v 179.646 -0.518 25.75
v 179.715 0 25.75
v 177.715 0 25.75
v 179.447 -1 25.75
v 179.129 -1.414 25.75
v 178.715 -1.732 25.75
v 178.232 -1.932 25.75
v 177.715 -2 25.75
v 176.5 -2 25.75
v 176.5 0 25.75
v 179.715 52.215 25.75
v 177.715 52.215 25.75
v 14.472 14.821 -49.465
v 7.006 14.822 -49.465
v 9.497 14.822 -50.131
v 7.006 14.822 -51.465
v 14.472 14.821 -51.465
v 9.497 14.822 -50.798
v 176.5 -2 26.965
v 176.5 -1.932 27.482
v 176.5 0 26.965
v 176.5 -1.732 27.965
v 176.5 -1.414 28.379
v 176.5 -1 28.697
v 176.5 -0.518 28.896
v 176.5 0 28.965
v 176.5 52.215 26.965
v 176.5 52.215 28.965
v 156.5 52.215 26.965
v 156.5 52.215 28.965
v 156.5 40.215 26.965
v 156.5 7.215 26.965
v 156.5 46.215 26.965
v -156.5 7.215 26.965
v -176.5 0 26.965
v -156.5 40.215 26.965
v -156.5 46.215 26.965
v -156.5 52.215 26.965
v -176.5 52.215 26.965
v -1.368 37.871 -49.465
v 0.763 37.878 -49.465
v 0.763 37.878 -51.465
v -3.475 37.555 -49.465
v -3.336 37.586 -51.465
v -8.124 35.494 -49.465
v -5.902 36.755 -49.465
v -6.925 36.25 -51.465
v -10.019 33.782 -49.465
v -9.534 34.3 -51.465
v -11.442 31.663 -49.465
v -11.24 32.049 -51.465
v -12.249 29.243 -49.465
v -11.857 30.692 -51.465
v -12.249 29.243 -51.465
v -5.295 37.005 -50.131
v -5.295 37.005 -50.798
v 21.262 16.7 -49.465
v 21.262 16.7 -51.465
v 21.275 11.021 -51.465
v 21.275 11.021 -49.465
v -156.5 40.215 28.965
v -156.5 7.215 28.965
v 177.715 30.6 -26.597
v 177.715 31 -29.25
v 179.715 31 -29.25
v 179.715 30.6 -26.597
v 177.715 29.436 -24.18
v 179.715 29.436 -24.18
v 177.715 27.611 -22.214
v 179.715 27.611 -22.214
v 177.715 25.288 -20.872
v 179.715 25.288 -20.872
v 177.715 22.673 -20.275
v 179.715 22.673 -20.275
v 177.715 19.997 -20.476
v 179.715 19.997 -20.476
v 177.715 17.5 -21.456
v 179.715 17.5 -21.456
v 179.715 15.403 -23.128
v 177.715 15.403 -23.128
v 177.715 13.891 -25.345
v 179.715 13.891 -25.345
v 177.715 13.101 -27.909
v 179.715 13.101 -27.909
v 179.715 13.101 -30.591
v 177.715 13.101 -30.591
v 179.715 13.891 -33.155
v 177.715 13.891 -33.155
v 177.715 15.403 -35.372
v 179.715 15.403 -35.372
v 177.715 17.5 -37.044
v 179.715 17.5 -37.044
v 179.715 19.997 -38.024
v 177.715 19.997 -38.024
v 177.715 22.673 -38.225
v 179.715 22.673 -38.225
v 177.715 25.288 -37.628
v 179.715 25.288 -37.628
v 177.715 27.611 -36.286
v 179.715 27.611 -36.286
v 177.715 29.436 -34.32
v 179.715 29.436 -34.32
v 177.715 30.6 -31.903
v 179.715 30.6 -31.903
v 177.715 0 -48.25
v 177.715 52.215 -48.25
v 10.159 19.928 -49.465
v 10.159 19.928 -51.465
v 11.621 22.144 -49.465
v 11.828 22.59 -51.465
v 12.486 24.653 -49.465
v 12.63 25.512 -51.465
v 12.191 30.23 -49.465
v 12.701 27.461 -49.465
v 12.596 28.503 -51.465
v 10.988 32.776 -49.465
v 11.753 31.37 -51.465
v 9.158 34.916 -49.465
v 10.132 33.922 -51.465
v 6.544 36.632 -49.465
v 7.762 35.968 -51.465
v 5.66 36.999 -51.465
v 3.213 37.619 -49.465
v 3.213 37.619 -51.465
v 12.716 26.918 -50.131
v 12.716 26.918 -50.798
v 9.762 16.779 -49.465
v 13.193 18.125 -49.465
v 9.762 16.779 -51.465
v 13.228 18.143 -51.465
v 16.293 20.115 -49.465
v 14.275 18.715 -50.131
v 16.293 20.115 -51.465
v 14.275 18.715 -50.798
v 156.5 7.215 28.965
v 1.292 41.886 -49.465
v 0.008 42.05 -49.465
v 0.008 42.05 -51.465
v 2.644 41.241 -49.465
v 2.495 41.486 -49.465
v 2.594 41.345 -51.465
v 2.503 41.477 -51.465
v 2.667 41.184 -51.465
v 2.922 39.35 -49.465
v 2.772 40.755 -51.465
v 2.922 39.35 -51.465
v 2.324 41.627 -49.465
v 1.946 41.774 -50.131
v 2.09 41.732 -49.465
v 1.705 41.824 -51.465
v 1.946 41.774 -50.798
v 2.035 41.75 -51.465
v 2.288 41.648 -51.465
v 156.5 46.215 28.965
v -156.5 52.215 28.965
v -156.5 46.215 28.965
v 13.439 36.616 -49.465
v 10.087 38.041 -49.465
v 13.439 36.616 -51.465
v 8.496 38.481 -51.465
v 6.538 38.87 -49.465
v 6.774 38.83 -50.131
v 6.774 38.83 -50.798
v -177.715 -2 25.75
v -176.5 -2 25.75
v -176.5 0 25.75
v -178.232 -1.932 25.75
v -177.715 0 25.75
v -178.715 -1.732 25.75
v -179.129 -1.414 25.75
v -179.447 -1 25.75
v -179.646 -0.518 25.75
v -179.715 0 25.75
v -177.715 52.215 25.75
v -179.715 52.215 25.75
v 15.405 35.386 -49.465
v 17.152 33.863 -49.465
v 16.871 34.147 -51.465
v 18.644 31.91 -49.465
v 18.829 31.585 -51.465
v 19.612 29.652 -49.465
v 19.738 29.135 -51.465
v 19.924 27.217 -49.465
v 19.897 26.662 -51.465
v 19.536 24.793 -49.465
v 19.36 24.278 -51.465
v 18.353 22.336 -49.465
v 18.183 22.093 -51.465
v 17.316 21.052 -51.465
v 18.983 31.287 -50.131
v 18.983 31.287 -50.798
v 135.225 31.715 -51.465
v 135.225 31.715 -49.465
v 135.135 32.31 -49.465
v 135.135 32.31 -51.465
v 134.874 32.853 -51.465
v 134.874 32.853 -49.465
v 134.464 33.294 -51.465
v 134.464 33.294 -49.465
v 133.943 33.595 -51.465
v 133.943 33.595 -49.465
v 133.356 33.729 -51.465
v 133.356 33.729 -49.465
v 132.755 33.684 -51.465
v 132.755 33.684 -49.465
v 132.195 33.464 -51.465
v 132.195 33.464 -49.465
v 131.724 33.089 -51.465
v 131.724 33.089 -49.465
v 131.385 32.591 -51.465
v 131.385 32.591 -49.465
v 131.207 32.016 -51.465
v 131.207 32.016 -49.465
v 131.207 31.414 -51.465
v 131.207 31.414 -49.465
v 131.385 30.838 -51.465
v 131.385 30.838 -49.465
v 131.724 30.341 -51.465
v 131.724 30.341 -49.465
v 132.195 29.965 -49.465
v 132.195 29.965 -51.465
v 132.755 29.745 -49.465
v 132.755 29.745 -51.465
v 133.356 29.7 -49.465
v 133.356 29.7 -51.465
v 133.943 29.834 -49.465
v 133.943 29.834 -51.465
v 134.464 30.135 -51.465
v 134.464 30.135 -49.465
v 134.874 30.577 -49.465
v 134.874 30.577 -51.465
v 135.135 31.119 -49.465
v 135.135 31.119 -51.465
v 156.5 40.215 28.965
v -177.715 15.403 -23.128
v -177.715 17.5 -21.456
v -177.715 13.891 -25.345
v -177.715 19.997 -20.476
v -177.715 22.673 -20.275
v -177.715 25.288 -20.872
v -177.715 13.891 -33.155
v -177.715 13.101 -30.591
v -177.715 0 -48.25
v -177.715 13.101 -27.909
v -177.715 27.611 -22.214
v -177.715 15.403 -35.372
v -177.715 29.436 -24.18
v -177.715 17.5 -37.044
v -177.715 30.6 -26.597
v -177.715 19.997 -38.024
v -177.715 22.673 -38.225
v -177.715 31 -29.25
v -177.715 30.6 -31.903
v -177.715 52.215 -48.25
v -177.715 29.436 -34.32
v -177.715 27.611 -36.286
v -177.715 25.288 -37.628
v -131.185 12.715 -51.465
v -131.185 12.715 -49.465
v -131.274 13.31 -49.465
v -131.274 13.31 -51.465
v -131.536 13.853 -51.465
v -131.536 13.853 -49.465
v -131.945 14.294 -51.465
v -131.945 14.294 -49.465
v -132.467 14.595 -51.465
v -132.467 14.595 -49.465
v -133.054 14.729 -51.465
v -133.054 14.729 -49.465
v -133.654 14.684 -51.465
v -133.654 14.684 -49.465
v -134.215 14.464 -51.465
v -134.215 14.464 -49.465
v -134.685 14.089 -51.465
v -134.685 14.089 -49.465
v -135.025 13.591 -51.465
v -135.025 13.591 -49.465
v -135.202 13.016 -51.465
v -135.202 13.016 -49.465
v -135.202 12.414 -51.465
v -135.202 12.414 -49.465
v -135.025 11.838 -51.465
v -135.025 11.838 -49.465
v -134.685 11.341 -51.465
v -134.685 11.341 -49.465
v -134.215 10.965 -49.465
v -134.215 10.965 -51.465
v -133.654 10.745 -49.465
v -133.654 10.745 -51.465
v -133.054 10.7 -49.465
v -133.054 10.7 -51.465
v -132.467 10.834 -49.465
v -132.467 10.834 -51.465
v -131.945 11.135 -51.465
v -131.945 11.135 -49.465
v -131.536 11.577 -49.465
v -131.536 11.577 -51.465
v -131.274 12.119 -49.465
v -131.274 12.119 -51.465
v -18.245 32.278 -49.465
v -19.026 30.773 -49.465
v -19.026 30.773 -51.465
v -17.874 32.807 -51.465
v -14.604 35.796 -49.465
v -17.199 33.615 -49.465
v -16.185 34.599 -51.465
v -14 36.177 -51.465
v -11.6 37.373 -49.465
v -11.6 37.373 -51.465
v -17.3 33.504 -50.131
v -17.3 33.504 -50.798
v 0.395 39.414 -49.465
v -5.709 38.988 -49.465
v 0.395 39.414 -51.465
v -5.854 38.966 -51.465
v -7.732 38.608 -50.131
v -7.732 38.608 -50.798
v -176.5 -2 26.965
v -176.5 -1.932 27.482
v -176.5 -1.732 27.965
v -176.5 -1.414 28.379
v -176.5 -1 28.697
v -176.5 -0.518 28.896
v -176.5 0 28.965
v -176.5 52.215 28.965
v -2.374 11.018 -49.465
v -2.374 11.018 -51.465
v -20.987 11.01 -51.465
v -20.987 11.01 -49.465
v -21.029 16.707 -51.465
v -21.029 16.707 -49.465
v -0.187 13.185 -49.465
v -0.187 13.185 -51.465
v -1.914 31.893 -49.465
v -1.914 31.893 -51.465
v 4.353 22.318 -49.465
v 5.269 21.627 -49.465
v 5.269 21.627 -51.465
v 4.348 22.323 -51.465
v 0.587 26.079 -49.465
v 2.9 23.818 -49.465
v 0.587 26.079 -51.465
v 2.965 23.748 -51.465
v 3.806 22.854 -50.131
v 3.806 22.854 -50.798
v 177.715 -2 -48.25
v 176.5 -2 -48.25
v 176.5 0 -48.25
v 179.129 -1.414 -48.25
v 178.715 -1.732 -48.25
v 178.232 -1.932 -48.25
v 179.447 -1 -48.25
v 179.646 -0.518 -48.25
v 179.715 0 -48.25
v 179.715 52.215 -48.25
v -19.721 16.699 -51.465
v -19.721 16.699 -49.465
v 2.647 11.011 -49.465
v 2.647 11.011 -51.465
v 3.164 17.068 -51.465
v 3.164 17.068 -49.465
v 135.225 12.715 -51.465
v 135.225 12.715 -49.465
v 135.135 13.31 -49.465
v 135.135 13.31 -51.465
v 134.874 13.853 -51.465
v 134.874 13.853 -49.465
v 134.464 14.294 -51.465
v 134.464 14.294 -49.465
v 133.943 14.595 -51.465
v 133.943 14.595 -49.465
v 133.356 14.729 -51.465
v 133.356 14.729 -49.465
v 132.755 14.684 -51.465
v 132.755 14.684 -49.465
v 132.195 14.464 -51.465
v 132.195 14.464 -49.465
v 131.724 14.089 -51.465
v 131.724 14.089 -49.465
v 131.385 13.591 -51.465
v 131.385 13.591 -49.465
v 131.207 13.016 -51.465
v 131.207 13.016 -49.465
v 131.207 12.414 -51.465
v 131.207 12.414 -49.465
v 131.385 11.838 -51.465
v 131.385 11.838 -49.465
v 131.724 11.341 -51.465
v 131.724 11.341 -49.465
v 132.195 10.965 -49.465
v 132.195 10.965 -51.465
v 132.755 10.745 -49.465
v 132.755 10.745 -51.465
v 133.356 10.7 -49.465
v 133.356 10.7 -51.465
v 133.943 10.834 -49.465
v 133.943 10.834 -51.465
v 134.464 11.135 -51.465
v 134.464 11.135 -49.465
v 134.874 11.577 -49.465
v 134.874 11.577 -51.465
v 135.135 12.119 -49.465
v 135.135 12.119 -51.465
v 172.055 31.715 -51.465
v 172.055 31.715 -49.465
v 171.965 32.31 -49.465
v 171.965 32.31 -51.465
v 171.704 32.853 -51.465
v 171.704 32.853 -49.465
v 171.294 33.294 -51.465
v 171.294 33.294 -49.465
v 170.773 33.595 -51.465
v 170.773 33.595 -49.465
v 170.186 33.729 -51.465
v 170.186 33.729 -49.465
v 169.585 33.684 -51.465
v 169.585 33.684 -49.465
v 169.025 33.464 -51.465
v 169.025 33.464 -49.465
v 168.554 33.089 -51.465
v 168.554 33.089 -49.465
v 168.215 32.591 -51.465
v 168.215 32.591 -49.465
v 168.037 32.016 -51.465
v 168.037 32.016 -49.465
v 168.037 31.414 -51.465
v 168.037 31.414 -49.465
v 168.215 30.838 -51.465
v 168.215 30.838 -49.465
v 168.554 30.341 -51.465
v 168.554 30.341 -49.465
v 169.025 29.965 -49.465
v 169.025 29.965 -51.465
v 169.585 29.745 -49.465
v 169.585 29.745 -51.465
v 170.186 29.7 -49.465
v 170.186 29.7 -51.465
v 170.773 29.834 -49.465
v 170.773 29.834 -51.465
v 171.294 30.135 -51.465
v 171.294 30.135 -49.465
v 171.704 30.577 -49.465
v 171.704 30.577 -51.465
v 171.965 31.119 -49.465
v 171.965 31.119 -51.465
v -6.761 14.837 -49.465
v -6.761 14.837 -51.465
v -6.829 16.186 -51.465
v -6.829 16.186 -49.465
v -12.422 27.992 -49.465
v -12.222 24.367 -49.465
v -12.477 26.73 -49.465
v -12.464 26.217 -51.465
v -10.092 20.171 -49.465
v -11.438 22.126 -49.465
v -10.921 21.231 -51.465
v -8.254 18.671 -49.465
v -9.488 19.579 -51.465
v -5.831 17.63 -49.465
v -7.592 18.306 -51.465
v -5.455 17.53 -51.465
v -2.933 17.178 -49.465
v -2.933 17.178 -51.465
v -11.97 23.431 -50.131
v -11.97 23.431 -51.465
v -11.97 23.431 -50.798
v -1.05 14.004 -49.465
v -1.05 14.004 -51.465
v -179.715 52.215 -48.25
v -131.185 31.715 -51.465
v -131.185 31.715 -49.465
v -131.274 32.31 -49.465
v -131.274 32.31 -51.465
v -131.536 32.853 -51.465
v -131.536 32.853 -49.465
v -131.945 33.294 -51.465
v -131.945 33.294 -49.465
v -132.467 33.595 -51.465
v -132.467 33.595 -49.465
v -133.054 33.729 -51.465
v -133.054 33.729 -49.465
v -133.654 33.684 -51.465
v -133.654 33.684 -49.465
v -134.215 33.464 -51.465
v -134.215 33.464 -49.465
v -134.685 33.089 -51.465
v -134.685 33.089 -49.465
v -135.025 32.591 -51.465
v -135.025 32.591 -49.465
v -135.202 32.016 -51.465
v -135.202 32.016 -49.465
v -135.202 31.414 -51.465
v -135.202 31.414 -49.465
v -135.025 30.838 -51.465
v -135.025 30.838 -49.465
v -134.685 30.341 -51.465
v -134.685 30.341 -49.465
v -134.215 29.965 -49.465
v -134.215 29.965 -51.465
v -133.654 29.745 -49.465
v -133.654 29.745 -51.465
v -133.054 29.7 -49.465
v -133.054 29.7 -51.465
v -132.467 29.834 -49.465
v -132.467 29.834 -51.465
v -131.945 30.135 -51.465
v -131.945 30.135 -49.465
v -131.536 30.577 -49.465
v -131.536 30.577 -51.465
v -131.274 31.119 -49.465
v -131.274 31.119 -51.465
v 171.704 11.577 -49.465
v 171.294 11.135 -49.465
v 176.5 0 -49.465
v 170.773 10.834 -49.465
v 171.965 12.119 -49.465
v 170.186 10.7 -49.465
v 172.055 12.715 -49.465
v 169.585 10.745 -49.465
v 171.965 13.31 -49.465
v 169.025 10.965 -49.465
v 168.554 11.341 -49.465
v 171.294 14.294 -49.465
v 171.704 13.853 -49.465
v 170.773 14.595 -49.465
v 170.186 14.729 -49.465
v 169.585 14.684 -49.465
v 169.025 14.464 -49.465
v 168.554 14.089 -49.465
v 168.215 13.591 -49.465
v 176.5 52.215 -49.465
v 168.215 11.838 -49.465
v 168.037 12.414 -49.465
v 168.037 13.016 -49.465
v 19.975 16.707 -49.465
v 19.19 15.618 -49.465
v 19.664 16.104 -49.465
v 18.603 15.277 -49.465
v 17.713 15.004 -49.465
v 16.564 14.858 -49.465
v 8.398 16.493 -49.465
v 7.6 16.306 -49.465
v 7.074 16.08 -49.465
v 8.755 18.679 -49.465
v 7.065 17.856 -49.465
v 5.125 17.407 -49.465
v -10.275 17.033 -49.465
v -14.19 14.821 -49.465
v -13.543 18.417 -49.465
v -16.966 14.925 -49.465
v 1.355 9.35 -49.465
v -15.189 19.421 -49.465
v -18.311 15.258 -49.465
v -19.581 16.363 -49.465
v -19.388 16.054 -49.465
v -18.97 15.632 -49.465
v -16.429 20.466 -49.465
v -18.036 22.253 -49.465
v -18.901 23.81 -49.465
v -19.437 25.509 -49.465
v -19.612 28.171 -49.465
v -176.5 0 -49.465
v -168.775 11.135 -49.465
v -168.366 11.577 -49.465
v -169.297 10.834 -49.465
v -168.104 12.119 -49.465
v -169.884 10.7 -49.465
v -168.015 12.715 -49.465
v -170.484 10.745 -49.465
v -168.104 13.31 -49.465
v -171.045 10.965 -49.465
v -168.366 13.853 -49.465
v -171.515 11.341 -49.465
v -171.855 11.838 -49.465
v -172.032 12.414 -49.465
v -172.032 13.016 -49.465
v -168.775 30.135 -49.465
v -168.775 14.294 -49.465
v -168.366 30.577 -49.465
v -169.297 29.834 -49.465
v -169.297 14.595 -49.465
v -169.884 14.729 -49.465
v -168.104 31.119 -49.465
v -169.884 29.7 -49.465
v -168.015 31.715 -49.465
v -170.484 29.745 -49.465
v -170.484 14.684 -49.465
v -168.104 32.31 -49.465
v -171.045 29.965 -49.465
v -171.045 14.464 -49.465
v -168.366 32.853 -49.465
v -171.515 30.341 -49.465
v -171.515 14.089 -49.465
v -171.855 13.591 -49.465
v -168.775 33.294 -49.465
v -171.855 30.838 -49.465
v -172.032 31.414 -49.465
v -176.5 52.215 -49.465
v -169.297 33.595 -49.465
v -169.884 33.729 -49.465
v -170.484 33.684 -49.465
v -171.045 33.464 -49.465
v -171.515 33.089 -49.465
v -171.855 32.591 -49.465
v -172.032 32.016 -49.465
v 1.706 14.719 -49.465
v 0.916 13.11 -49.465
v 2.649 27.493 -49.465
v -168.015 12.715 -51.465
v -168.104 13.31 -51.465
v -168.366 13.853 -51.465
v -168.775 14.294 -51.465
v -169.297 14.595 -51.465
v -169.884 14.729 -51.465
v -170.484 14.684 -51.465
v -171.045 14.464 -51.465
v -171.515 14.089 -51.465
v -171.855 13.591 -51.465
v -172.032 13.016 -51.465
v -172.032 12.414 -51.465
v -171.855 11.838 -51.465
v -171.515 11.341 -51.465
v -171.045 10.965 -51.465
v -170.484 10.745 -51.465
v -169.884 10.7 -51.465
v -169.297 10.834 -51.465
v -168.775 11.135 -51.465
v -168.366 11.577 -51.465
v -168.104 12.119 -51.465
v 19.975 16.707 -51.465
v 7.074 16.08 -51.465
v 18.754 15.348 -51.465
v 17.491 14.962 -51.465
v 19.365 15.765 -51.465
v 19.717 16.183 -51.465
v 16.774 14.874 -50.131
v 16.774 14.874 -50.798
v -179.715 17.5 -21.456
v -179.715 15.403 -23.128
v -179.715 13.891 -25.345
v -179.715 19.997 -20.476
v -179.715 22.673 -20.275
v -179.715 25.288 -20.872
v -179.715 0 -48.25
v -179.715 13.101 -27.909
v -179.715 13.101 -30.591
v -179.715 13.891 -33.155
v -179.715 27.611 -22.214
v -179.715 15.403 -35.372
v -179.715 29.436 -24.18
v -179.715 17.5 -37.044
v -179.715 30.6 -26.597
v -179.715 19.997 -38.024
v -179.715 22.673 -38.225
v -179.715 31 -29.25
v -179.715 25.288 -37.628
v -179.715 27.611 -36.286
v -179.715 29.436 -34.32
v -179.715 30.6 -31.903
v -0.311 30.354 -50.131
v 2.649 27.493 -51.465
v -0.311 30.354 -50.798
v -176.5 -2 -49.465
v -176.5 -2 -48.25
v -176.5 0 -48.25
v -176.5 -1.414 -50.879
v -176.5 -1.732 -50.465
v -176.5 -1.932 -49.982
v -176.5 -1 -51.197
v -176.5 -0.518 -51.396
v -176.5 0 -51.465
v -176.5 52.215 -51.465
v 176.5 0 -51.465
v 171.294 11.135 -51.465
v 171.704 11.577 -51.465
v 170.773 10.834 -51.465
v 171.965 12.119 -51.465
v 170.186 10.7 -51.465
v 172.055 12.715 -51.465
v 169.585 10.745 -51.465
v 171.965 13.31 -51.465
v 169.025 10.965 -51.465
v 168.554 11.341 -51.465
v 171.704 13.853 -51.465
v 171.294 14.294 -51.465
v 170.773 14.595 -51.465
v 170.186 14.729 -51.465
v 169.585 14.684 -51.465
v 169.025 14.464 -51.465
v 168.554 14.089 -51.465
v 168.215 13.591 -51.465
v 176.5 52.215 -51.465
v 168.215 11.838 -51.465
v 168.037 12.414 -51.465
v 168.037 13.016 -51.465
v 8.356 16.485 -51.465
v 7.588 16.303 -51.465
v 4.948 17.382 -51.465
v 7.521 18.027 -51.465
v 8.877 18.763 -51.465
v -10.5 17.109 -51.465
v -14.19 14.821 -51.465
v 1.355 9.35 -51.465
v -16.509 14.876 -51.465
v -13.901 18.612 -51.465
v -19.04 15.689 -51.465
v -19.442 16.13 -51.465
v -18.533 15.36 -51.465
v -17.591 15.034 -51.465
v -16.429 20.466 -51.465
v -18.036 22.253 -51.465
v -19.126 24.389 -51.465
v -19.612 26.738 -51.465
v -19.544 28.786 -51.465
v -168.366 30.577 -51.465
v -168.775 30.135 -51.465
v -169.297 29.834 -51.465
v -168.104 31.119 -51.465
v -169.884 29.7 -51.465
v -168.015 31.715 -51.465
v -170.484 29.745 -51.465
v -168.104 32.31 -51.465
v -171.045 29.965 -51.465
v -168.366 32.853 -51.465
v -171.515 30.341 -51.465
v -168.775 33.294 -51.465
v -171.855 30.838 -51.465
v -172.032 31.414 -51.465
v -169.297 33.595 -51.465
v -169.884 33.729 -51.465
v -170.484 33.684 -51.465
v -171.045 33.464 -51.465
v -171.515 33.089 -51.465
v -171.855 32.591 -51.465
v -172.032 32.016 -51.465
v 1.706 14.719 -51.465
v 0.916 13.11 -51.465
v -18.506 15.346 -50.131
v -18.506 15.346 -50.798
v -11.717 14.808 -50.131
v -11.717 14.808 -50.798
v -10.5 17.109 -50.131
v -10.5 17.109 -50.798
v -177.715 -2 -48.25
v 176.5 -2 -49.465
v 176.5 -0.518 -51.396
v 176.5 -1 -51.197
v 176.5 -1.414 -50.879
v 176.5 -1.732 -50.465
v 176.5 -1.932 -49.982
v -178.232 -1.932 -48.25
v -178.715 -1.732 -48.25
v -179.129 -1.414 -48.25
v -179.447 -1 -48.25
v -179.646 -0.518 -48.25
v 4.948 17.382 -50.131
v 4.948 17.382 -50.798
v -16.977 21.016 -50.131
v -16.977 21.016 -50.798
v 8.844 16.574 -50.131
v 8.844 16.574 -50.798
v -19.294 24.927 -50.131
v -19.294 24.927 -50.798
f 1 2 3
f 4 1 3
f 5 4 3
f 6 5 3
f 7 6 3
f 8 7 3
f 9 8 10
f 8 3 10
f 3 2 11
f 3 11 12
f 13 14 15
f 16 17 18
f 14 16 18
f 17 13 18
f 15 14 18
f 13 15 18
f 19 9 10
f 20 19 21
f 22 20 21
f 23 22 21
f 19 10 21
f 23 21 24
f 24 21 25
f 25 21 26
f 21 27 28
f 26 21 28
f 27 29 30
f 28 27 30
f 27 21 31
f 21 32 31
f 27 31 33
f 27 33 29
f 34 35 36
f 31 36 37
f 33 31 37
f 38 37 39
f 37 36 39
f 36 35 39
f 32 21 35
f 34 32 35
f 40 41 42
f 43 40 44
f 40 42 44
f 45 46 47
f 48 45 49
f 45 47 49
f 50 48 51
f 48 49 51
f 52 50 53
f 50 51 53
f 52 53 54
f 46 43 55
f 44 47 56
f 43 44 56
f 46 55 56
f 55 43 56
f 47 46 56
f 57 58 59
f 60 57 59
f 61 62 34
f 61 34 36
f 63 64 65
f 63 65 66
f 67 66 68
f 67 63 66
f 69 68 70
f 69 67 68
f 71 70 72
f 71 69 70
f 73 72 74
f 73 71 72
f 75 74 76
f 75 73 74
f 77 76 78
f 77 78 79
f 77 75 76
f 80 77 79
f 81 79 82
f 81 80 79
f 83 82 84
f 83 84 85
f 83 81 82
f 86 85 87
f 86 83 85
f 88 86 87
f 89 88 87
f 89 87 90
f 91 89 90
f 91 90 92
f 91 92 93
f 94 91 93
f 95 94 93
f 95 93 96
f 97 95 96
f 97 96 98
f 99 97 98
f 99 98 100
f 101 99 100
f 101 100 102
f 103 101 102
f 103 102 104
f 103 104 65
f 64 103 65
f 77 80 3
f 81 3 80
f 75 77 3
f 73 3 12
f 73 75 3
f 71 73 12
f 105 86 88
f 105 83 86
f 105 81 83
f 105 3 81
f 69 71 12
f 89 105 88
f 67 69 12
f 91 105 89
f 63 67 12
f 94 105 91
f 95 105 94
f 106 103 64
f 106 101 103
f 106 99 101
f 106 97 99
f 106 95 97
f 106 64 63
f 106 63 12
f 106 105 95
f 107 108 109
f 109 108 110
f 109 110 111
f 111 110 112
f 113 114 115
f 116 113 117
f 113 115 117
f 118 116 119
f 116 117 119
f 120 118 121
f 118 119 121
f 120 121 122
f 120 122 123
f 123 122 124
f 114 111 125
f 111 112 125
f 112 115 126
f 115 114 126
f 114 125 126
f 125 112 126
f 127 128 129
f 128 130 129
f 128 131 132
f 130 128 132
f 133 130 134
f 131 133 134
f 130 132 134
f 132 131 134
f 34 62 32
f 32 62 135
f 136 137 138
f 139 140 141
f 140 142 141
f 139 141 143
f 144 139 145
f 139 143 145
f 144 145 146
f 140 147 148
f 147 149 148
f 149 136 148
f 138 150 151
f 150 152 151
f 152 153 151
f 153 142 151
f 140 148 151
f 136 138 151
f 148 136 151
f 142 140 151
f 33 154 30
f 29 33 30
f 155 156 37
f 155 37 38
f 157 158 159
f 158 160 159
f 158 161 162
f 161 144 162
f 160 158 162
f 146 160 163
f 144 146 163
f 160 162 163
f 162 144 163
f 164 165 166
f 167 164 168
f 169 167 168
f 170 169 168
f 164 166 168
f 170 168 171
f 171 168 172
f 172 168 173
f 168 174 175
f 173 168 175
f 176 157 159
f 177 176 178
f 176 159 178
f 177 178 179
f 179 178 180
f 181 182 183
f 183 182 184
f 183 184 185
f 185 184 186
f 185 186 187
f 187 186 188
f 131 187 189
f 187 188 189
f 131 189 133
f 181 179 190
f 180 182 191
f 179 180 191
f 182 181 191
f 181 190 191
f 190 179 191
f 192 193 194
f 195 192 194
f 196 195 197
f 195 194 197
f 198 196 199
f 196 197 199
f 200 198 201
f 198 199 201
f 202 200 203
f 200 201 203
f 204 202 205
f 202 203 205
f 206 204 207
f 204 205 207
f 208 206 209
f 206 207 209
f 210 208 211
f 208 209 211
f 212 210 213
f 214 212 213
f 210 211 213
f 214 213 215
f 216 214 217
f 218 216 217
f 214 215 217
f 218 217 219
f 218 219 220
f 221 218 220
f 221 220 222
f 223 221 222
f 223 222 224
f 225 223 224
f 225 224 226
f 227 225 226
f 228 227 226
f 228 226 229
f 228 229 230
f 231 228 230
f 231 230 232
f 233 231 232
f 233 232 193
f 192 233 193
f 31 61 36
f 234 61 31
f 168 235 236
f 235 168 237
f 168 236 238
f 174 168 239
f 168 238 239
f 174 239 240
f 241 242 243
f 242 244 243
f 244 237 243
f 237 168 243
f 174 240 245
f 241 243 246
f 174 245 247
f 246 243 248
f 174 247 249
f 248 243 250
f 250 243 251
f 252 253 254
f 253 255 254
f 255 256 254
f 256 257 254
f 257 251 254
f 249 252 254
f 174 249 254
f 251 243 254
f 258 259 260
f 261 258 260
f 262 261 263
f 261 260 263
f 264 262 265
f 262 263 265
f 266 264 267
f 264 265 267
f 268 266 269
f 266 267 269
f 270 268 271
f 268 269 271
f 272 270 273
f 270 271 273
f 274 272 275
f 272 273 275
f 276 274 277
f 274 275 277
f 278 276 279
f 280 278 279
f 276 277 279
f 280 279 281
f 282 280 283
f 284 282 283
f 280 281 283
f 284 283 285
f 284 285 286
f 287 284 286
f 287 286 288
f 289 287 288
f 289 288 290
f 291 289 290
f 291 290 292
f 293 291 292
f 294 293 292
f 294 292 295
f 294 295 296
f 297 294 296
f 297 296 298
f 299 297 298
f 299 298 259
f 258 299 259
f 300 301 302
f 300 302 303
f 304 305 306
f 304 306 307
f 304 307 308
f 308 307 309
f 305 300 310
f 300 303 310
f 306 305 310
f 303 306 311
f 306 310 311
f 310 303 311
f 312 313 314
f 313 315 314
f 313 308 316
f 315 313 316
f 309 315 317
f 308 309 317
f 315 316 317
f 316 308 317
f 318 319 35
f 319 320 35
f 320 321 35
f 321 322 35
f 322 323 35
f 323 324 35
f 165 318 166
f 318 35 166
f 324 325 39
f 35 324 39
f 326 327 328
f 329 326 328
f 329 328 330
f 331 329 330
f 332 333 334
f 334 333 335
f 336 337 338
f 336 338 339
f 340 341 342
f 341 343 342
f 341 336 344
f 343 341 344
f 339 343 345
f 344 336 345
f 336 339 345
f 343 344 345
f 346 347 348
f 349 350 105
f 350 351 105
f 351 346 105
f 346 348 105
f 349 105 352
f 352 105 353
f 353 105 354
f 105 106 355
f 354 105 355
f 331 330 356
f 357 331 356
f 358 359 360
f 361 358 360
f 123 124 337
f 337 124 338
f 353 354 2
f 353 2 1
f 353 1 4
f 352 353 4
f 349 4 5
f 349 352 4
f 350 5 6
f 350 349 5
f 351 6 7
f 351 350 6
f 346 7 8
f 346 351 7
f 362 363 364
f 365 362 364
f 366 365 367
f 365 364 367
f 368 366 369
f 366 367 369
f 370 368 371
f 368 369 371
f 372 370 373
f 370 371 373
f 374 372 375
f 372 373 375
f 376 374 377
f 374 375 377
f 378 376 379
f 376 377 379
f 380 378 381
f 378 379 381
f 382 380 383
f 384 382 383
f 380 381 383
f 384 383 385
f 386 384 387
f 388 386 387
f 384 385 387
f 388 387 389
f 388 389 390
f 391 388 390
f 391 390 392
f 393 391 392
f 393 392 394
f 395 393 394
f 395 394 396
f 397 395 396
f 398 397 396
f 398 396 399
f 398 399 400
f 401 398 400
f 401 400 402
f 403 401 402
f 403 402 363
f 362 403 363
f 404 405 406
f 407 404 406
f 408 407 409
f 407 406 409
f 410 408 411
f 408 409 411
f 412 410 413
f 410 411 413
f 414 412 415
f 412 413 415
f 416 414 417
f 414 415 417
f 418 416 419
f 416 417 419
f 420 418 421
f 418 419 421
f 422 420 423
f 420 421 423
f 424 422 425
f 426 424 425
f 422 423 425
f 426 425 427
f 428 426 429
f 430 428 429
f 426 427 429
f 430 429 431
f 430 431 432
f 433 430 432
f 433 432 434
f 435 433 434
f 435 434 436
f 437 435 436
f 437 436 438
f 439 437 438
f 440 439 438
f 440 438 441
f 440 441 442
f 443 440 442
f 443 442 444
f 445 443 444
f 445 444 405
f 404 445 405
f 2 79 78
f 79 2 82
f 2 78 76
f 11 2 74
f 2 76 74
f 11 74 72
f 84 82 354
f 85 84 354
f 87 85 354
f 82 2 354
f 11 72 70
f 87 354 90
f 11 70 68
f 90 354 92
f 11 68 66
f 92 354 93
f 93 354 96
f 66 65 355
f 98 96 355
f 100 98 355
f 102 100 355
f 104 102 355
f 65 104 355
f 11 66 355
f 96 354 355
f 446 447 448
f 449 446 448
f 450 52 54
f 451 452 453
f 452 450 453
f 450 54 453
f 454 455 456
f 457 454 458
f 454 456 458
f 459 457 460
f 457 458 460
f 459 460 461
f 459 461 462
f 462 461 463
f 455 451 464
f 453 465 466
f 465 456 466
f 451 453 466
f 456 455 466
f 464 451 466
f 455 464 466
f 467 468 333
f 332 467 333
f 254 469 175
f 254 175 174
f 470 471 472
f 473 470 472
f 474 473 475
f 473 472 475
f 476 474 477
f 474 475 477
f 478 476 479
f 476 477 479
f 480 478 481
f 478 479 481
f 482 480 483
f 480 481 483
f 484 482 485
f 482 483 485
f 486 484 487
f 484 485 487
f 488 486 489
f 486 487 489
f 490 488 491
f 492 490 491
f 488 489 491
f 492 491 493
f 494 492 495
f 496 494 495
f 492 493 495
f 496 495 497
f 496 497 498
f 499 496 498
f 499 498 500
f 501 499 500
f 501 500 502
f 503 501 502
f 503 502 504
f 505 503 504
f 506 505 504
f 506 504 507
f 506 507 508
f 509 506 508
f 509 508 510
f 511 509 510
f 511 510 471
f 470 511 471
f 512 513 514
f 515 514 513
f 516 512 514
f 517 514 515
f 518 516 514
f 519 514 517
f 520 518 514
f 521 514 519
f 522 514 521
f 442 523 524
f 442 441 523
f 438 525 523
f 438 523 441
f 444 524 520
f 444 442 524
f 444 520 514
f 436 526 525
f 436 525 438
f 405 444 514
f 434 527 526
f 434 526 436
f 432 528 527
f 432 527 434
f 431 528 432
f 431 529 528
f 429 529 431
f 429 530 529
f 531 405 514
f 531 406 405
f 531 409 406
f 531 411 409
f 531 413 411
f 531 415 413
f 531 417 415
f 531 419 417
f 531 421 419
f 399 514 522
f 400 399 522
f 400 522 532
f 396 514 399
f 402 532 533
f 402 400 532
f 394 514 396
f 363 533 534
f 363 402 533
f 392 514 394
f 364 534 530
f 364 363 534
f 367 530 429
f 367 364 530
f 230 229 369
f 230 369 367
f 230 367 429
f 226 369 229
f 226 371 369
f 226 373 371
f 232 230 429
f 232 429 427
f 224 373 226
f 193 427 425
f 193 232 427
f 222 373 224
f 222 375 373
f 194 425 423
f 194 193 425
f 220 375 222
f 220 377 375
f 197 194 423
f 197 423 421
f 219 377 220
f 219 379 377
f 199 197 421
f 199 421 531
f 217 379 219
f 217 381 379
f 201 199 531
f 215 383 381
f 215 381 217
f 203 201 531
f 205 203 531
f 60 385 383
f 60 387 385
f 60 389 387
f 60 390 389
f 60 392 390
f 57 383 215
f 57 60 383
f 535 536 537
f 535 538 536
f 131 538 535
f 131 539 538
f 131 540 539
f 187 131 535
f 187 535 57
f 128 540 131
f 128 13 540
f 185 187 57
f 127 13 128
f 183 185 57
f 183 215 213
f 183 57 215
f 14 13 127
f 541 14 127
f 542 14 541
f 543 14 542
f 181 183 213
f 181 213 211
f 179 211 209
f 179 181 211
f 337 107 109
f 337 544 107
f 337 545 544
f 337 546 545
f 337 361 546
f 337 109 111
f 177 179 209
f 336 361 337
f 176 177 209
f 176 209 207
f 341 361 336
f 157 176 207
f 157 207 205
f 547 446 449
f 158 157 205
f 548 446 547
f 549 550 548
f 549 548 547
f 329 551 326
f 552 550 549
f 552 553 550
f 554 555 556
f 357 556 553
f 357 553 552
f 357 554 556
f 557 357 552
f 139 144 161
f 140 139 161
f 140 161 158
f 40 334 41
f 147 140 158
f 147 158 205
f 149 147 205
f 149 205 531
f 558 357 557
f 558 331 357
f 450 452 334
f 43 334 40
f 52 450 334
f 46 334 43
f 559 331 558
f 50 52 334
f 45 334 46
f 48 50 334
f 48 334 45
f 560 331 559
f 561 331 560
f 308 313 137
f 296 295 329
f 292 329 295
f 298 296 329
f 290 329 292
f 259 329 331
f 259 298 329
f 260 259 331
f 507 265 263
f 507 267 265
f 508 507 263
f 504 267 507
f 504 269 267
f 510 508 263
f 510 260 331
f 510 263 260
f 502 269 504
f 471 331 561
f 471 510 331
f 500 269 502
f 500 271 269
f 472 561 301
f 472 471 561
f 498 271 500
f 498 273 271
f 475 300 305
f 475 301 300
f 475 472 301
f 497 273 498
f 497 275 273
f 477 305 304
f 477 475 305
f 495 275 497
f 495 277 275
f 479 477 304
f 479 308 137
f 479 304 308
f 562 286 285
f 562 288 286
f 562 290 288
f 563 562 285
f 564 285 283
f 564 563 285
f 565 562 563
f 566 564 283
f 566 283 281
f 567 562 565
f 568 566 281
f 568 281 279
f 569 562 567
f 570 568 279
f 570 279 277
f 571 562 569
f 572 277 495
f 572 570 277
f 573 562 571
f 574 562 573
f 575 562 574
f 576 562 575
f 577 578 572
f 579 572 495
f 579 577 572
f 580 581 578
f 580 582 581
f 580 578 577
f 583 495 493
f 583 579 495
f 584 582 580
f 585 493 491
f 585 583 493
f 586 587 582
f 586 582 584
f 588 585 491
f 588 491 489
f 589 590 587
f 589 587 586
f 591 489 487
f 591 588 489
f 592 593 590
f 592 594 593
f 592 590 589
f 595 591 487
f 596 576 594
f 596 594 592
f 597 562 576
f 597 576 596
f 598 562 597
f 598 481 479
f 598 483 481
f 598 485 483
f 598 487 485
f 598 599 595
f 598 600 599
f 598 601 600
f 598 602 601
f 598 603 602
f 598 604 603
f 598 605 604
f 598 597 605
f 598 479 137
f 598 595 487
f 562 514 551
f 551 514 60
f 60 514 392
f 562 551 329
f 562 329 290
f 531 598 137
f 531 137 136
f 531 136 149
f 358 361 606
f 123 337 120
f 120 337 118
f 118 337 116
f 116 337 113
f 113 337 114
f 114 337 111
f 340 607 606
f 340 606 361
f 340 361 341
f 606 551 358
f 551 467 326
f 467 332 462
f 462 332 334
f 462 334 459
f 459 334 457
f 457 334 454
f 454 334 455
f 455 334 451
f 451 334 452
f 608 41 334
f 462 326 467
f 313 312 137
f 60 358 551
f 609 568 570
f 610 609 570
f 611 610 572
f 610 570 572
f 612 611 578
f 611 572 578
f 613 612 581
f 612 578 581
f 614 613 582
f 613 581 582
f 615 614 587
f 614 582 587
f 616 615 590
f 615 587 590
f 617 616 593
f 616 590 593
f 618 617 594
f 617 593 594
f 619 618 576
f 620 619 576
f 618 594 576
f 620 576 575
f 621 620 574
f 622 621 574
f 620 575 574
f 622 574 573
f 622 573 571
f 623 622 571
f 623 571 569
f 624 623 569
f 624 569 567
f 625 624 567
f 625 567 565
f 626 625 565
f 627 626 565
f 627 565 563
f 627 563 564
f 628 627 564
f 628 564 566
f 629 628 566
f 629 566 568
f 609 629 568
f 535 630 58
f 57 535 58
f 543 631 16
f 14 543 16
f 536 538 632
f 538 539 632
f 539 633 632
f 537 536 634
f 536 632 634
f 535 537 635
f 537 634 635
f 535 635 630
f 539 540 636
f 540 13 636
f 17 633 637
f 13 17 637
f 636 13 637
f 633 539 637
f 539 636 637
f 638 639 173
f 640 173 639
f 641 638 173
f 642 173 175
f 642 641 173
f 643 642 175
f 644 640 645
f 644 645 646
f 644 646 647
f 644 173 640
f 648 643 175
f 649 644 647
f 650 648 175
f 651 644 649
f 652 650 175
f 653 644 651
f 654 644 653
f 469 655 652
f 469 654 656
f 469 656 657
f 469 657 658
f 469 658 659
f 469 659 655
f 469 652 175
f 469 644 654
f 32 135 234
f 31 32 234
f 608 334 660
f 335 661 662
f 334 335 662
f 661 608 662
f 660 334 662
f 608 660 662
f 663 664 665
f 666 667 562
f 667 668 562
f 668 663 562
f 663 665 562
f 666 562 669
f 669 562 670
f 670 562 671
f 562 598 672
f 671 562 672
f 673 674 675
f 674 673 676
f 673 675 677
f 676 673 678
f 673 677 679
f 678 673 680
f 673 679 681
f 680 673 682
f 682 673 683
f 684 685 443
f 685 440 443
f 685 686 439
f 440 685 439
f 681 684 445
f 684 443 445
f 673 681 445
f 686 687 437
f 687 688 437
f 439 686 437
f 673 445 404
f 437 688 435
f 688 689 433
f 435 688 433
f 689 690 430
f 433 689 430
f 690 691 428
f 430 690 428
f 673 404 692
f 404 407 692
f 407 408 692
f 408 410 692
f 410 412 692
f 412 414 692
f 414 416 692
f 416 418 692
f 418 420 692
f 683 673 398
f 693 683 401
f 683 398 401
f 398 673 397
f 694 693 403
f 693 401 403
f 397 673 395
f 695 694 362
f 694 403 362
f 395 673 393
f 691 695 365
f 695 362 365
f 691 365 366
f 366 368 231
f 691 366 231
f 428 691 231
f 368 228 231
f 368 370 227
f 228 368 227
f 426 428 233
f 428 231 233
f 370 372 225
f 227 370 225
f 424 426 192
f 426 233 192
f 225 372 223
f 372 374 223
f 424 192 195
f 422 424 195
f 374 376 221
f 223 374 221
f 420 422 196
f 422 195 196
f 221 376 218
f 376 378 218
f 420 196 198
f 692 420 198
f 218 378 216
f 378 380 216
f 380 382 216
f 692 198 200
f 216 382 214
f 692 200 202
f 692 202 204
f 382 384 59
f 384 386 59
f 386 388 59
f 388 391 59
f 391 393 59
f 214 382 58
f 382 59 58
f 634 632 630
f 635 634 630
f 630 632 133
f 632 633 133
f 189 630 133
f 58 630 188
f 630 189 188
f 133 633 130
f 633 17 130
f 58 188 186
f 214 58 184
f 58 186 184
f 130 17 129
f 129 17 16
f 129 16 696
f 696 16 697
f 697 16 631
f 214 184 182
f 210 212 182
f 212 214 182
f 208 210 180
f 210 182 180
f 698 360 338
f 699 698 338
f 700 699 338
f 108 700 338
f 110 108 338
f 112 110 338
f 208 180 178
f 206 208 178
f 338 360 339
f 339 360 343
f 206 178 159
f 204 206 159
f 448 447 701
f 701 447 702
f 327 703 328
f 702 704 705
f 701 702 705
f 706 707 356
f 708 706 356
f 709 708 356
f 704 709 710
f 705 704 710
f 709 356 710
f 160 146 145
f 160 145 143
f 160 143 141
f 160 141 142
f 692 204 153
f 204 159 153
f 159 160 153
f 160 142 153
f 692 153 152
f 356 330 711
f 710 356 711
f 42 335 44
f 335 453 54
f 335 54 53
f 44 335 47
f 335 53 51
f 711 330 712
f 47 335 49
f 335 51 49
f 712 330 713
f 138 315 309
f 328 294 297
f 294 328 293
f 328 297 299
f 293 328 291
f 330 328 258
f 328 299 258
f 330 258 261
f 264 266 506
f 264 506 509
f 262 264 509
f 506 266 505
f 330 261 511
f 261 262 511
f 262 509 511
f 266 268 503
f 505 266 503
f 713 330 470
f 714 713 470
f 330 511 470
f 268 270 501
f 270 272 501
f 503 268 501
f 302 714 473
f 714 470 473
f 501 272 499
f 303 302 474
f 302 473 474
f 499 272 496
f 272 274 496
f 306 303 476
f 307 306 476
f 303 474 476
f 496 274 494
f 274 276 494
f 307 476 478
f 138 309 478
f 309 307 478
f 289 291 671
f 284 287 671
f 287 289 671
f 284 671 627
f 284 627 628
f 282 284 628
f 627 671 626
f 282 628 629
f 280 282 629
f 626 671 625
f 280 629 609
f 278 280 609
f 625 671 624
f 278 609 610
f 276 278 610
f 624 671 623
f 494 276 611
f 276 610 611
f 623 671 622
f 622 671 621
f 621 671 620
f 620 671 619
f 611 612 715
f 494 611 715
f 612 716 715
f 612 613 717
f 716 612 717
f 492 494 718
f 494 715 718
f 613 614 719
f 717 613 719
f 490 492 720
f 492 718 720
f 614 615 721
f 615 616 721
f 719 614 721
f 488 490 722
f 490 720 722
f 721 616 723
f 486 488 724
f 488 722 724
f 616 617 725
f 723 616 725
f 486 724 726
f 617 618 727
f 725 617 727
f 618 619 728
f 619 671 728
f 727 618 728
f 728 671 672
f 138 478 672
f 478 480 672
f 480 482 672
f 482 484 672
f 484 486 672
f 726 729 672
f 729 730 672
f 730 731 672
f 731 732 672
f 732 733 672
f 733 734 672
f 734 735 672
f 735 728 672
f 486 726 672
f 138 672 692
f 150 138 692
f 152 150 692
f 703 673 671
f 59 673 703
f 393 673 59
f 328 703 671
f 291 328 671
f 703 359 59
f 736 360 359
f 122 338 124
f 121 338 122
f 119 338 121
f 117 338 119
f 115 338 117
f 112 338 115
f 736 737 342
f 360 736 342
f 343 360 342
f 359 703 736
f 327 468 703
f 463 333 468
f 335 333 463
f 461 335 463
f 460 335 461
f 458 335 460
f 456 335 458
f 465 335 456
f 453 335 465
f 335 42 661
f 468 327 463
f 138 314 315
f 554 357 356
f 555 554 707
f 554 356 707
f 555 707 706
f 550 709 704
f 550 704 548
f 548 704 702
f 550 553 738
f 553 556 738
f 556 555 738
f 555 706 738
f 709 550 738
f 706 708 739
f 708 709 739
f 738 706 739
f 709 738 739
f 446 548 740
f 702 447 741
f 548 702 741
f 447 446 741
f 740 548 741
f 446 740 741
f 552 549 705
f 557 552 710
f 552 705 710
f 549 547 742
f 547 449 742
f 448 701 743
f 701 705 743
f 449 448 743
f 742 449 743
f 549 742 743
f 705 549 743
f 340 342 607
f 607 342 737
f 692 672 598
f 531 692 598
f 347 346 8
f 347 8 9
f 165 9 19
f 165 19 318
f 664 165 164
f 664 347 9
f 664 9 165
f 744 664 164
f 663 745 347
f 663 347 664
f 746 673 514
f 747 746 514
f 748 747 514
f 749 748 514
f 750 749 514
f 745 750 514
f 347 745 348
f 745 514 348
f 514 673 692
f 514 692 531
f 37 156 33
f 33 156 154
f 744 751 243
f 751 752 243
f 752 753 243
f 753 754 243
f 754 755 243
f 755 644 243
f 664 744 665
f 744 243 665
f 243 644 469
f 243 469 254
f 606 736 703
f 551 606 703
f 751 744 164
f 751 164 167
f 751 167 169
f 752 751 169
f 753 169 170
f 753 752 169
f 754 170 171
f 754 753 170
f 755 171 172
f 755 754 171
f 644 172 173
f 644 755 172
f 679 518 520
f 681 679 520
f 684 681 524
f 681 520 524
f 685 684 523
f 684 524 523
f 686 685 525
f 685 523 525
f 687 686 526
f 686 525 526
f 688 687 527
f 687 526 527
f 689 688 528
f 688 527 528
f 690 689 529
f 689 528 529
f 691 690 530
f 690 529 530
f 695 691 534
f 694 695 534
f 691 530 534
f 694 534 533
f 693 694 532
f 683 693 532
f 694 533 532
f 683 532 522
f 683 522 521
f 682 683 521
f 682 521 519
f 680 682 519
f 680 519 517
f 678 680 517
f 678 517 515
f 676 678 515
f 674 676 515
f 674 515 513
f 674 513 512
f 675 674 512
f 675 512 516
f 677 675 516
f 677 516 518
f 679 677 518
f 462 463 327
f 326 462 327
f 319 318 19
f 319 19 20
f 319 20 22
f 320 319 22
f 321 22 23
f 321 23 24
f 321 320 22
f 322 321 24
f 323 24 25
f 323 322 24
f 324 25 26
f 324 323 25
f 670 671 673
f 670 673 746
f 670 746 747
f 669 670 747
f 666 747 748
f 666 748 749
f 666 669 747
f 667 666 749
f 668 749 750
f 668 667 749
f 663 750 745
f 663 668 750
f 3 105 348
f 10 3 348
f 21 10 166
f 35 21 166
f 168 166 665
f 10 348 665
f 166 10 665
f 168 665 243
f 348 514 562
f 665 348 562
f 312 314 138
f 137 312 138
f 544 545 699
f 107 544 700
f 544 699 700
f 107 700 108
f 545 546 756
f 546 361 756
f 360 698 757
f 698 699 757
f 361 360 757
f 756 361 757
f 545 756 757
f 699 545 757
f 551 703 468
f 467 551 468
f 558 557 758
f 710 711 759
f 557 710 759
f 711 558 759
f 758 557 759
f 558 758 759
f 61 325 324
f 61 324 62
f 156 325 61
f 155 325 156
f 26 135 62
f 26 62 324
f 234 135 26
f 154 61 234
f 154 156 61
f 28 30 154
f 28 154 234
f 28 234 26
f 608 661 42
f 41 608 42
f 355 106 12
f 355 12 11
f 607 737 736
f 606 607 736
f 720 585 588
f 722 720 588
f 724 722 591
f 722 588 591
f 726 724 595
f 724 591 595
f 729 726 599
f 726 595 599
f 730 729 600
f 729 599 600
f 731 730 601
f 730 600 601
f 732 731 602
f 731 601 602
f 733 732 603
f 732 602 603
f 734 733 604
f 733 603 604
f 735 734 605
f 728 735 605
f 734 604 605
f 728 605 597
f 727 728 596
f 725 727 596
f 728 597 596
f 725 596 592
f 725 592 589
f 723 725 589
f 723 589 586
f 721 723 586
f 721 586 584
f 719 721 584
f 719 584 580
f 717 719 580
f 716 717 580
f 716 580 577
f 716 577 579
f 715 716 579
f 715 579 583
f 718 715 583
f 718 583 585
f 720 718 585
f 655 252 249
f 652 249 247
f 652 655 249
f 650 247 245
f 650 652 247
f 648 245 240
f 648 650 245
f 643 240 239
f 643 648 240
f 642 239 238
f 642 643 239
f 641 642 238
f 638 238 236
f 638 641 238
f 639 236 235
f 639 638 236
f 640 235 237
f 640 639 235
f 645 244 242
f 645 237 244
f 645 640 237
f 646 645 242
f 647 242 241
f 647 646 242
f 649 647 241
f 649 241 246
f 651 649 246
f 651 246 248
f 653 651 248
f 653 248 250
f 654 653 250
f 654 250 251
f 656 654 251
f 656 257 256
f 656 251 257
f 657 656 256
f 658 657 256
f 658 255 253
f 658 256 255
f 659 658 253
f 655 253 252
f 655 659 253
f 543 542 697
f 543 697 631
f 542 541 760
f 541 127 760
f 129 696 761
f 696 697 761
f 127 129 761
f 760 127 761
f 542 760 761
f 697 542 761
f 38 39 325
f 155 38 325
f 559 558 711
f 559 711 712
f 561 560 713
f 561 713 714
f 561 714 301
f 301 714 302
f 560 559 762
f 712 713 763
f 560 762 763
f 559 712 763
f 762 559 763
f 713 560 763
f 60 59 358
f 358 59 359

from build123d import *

# Parameters (mm, degrees)
FLANGE_BASE1_DEPTH                             = 2
DOBRA_START                                    = -48.25
DOBRA_ESBO_ADA1_OUTLINE_W                      = 2
DOBRA_ESBO_ADA1_OUTLINE_H                      = 52.214601837
DOBRA_ESBO_ADA1_DEPTH                          = 74
DOBRA_START_2                                  = -176.5
DOBRA_ESBO_ADA1_2_OUTLINE_W                    = 52.214601837
DOBRA_ESBO_ADA1_2_OUTLINE_H                    = 2
DOBRA_ESBO_ADA1_2_DEPTH                        = 353
DOBRA_START_3                                  = -103.25
DOBRA_ESBO_ADA1_3_OUTLINE_W                    = 353
DOBRA_ESBO_ADA1_3_OUTLINE_H                    = 2
DOBRA_ESBO_ADA1_3_DEPTH                        = 51.785398163
DOBRA_START_4                                  = 28.964601837
DOBRA_ESBO_ADA1_4_OUTLINE_W                    = 353
DOBRA_ESBO_ADA1_4_OUTLINE_H                    = 2
DOBRA_ESBO_ADA1_4_DEPTH                        = 51.785398163
DOBRA_ESBO_ADA1_5_DEPTH                        = 74
DOBRA_ESBO_ADA1_6_DEPTH                        = 353
DOBRA_START_5                                  = -231.5
DOBRA_ESBO_ADA1_7_OUTLINE_W                    = 2
DOBRA_ESBO_ADA1_7_OUTLINE_H                    = 74
DOBRA_ESBO_ADA1_7_DEPTH                        = 51.785398163
DOBRA_START_6                                  = 179.714601837
DOBRA_ESBO_ADA1_8_OUTLINE_W                    = 2
DOBRA_ESBO_ADA1_8_OUTLINE_H                    = 74
DOBRA_ESBO_ADA1_8_DEPTH                        = 51.785398163
FURO1_START                                    = -179.714601837
FURO1_OUTLINE_R                                = 9
FURO1_DEPTH                                    = 359.429203674
CORTE_EXTRUS_O1_REACH                          = 205.697
ESBO_O9_W                                      = 313
ESBO_O9_H                                      = 33
ESBO_O9_H_2                                    = 6
BROCA_DE_ROSQUEAR_DE_CANO_PARA_TARRAXA_D_D     = 4.04
BROCA_DE_ROSQUEAR_DE_CANO_PARA_TARRAXA_D_DEPTH = 10
BROCA_DE_ROSQUEAR_DE_CANO_PARA_TARRAXA_D_TIP   = 1.21373845
CORTE_EXTRUS_O2_DEPTH                          = 8


# Read off the part's stored shape, not the designer's step: Dobra esboçada1, Furo1
# Sheet-metal steps are written as plain solids
with BuildPart() as part:
    # Esboço1 → Flange-base1 (new body)
    with BuildSketch(Plane(origin=(0, 0, 0), x_dir=(1, 0, 0), z_dir=(0, 1, 0))):
        Polygon((176.5, 103.25), (176.5, 48.25), (231.5, 48.25), (231.5, -25.75), (176.5, -25.75), (176.5, -80.75), (-176.5, -80.75), (-176.5, -25.75), (-231.5, -25.75), (-231.5, 48.25), (-176.5, 48.25), (-176.5, 103.25), align=None)
    extrude(amount=-FLANGE_BASE1_DEPTH)

    # Dobra esboçada1 outline → Dobra esboçada1 (add)
    with BuildSketch(Plane.XY.offset(DOBRA_START)):
        with Locations((178.714601837, 26.107300919)):
            Rectangle(DOBRA_ESBO_ADA1_OUTLINE_W, DOBRA_ESBO_ADA1_OUTLINE_H)
        with Locations((-178.714601837, 26.107300919)):
            Rectangle(DOBRA_ESBO_ADA1_OUTLINE_W, DOBRA_ESBO_ADA1_OUTLINE_H)
    extrude(amount=DOBRA_ESBO_ADA1_DEPTH)

    # Dobra esbo_ada1 2 outline → Dobra esbo_ada1 2 (add)
    with BuildSketch(Plane.YZ.offset(DOBRA_START_2)):
        with Locations((26.107300919, -50.464601837)):
            Rectangle(DOBRA_ESBO_ADA1_2_OUTLINE_W, DOBRA_ESBO_ADA1_2_OUTLINE_H)
        with Locations((26.107300919, 27.964601837)):
            Rectangle(DOBRA_ESBO_ADA1_2_OUTLINE_W, DOBRA_ESBO_ADA1_2_OUTLINE_H)
    extrude(amount=DOBRA_ESBO_ADA1_2_DEPTH)

    # Dobra esbo_ada1 3 outline → Dobra esbo_ada1 3 (cut)
    with BuildSketch(Plane.XY.offset(DOBRA_START_3)):
        with Locations((0, -1)):
            Rectangle(DOBRA_ESBO_ADA1_3_OUTLINE_W, DOBRA_ESBO_ADA1_3_OUTLINE_H)
    extrude(amount=DOBRA_ESBO_ADA1_3_DEPTH, mode=Mode.SUBTRACT)

    # Dobra esbo_ada1 4 outline → Dobra esbo_ada1 4 (cut)
    with BuildSketch(Plane.XY.offset(DOBRA_START_4)):
        with Locations((0, -1)):
            Rectangle(DOBRA_ESBO_ADA1_4_OUTLINE_W, DOBRA_ESBO_ADA1_4_OUTLINE_H)
    extrude(amount=DOBRA_ESBO_ADA1_4_DEPTH, mode=Mode.SUBTRACT)

    # Dobra esbo_ada1 5 outline → Dobra esbo_ada1 5 (cut)
    with BuildSketch(Plane.XY.offset(DOBRA_START)):
        with BuildLine():
            Line((231.5, 0), (179.714601837, 0))
            ThreePointArc((179.714601837, 0), (179.128815399, -1.414213562), (177.714601837, -2))
            Line((177.714601837, -2), (231.5, -2))
            Line((231.5, -2), (231.5, 0))
        make_face()
        with BuildLine():
            Line((-231.5, -2), (-177.714601837, -2))
            ThreePointArc((-177.714601837, -2), (-179.128815399, -1.414213562), (-179.714601837, 0))
            Line((-179.714601837, 0), (-231.5, 0))
            Line((-231.5, 0), (-231.5, -2))
        make_face()
    extrude(amount=DOBRA_ESBO_ADA1_5_DEPTH, mode=Mode.SUBTRACT)

    # Dobra esbo_ada1 6 outline → Dobra esbo_ada1 6 (cut)
    with BuildSketch(Plane.YZ.offset(DOBRA_START_2)):
        with BuildLine():
            Line((0, -103.25), (0, -51.464601837))
            ThreePointArc((0, -51.464601837), (-1.414213562, -50.878815399), (-2, -49.464601837))
            Line((-2, -49.464601837), (-2, -103.25))
            Line((-2, -103.25), (0, -103.25))
        make_face()
        with BuildLine():
            Line((-2, 80.75), (-2, 26.964601837))
            ThreePointArc((-2, 26.964601837), (-1.414213562, 28.378815399), (0, 28.964601837))
            Line((0, 28.964601837), (0, 80.75))
            Line((0, 80.75), (-2, 80.75))
        make_face()
    extrude(amount=DOBRA_ESBO_ADA1_6_DEPTH, mode=Mode.SUBTRACT)

    # Dobra esbo_ada1 7 outline → Dobra esbo_ada1 7 (cut)
    with BuildSketch(Plane.YZ.offset(DOBRA_START_5)):
        with Locations((-1, -11.25)):
            Rectangle(DOBRA_ESBO_ADA1_7_OUTLINE_W, DOBRA_ESBO_ADA1_7_OUTLINE_H)
    extrude(amount=DOBRA_ESBO_ADA1_7_DEPTH, mode=Mode.SUBTRACT)

    # Dobra esbo_ada1 8 outline → Dobra esbo_ada1 8 (cut)
    with BuildSketch(Plane.YZ.offset(DOBRA_START_6)):
        with Locations((-1, -11.25)):
            Rectangle(DOBRA_ESBO_ADA1_8_OUTLINE_W, DOBRA_ESBO_ADA1_8_OUTLINE_H)
    extrude(amount=DOBRA_ESBO_ADA1_8_DEPTH, mode=Mode.SUBTRACT)

    # Furo1 outline → Furo1 (cut)
    with BuildSketch(Plane.YZ.offset(FURO1_START)):
        with Locations((22, -29.25)):
            Circle(FURO1_OUTLINE_R)
    extrude(amount=FURO1_DEPTH, mode=Mode.SUBTRACT)

    # Esboço9 → Corte-extrusão1 (cut, up to next)
    with BuildSketch(Plane.XY.offset(28.964601837), mode=Mode.PRIVATE) as corte_extrus_o1_sk1:
        with Locations((0, 23.714601837)):
            Rectangle(ESBO_O9_W, ESBO_O9_H)
    corte_extrus_o1_tool1 = extrude(corte_extrus_o1_sk1.sketch, amount=-CORTE_EXTRUS_O1_REACH, mode=Mode.PRIVATE) & part.part
    # Esboço9 → Corte-extrusão1 (cut, up to next)
    with BuildSketch(Plane.XY.offset(28.964601837), mode=Mode.PRIVATE) as corte_extrus_o1_sk2:
        with Locations((0, 49.214601837)):
            Rectangle(ESBO_O9_W, ESBO_O9_H_2)
    corte_extrus_o1_tool2 = extrude(corte_extrus_o1_sk2.sketch, amount=-CORTE_EXTRUS_O1_REACH, mode=Mode.PRIVATE) & part.part
    add(corte_extrus_o1_tool1.solids().sort_by_distance((0, 23.714602, 28.964602))[0], mode=Mode.SUBTRACT)
    add(corte_extrus_o1_tool2.solids().sort_by_distance((0, 49.214602, 28.964602))[0], mode=Mode.SUBTRACT)

    # Broca de rosquear de cano para tarraxa de 1/81
    with Locations(Plane(origin=(0, 0, -51.464601837), x_dir=(-1, 0, 0), z_dir=(0, 0, -1))):
        with Locations((-170.034601837, 31.714601837), (-133.204601837, 31.714601837), (-133.204601837, 12.714601837), (-170.034601837, 12.714601837), (133.204601837, 31.714601837), (133.204601837, 12.714601837), (170.034601837, 12.714601837), (170.034601837, 31.714601837)):
            Hole(BROCA_DE_ROSQUEAR_DE_CANO_PARA_TARRAXA_D_D / 2, depth=BROCA_DE_ROSQUEAR_DE_CANO_PARA_TARRAXA_D_DEPTH)
            with Locations((0, 0, -(BROCA_DE_ROSQUEAR_DE_CANO_PARA_TARRAXA_D_DEPTH + BROCA_DE_ROSQUEAR_DE_CANO_PARA_TARRAXA_D_TIP / 2))):  # 118° drill point
                Cone(0, BROCA_DE_ROSQUEAR_DE_CANO_PARA_TARRAXA_D_D / 2, BROCA_DE_ROSQUEAR_DE_CANO_PARA_TARRAXA_D_TIP, mode=Mode.SUBTRACT)

    # Esboço12 → Corte-extrusão2 (cut)
    with BuildSketch(Plane(origin=(0, 7.850437939, -51.464601837), x_dir=(-1, 0, 0), z_dir=(0, 0, -1))):
        with BuildLine():
            Line((-2.646705655, 3.160945272), (-3.164128855, 9.217791872))
            add(Edge.make_bspline(
                [(-3.164128855, 9.217791872), (-4.311386855, 9.672838072), (-7.731481855, 9.241492472), (-10.158731855, 12.077611072)],
                knots=[0.261904762, 0.261904762, 0.261904762, 0.261904762, 0.285714286, 0.285714286, 0.285714286, 0.285714286], degree=3))
            add(Edge.make_bspline(
                [(-10.158731855, 12.077611072), (-15.373502255, 18.170846472), (-12.396217455, 28.398519872), (-3.212939855, 29.768074072)],
                knots=[0.285714286, 0.285714286, 0.285714286, 0.285714286, 0.30952381, 0.30952381, 0.30952381, 0.30952381], degree=3))
            Line((-3.212939855, 29.768074072), (-5.269279455, 13.776526472))
            add(Edge.make_bspline(
                [(-5.269279455, 13.776526472), (-4.047355255, 14.385959072), (-1.907491655, 17.339490072), (-0.586961255, 18.228196072)],
                knots=[0.333333333, 0.333333333, 0.333333333, 0.333333333, 0.357142857, 0.357142857, 0.357142857, 0.357142857], degree=3))
            Line((-0.586961255, 18.228196072), (-0.9157082, 5.259567806))
            Line((-0.9157082, 5.259567806), (-1.705717355, 6.868932949))
            Line((-1.705717355, 6.868932949), (-1.355146331, 1.499369274))
            Line((-1.355146331, 1.499369274), (1.050242145, 6.153521386))
            Line((1.050242145, 6.153521386), (0.186540145, 5.334670672))
            Line((0.186540145, 5.334670672), (1.913944145, 24.042769872))
            add(Edge.make_bspline(
                [(1.913944145, 24.042769872), (0.740485145, 23.019388072), (-2.190435855, 19.896601272), (-2.648807055, 19.642784072)],
                knots=[0.547619048, 0.547619048, 0.547619048, 0.547619048, 0.571428571, 0.571428571, 0.571428571, 0.571428571], degree=3))
            Line((-2.648807055, 19.642784072), (-0.762627655, 30.027158072))
            add(Edge.make_bspline(
                [(-0.762627655, 30.027158072), (5.758708145, 30.466989072), (11.283900545, 26.658640472), (12.249214545, 21.392452272)],
                knots=[0.595238095, 0.595238095, 0.595238095, 0.595238095, 0.619047619, 0.619047619, 0.619047619, 0.619047619], degree=3))
            add(Edge.make_bspline(
                [(12.249214545, 21.392452272), (13.386923145, 15.185874272), (10.269722345, 9.663687672), (2.933256145, 9.327277472)],
                knots=[0.619047619, 0.619047619, 0.619047619, 0.619047619, 0.642857143, 0.642857143, 0.642857143, 0.642857143], degree=3))
            Line((2.933256145, 9.327277472), (2.374363545, 3.167887872))
            Line((2.374363545, 3.167887872), (20.987394345, 3.159907872))
            Line((20.987394345, 3.159907872), (21.028863745, 8.856563872))
            Line((21.028863745, 8.856563872), (19.721260945, 8.848371072))
            add(Edge.make_bspline(
                [(19.721260945, 8.848371072), (19.077700545, 6.901330872), (16.463612145, 6.968655472), (14.190189945, 6.970570672)],
                knots=[0.738095238, 0.738095238, 0.738095238, 0.738095238, 0.761904762, 0.761904762, 0.761904762, 0.761904762], degree=3))
            add(Edge.make_bspline(
                [(14.190189945, 6.970570672), (11.738494545, 6.972672072), (9.201519545, 6.906331672), (6.760703545, 6.986291272)],
                knots=[0.761904762, 0.761904762, 0.761904762, 0.761904762, 0.785714286, 0.785714286, 0.785714286, 0.785714286], degree=3))
            Line((6.760703545, 6.986291272), (6.829012345, 8.335602872))
            add(Edge.make_bspline(
                [(6.829012345, 8.335602872), (10.435014745, 8.891808872), (14.538703145, 10.663528472), (16.428712945, 12.615755672)],
                knots=[0.80952381, 0.80952381, 0.80952381, 0.80952381, 0.833333333, 0.833333333, 0.833333333, 0.833333333], degree=3))
            add(Edge.make_bspline(
                [(16.428712945, 12.615755672), (17.007316145, 13.213324672), (17.472071345, 13.598253272), (18.036443545, 14.402504272)],
                knots=[0.833333333, 0.833333333, 0.833333333, 0.833333333, 0.857142857, 0.857142857, 0.857142857, 0.857142857], degree=3))
            add(Edge.make_bspline(
                [(18.036443545, 14.402504272), (19.749057945, 16.843213872), (20.106428945, 20.135283072), (19.026149745, 22.922537472)],
                knots=[0.857142857, 0.857142857, 0.857142857, 0.857142857, 0.880952381, 0.880952381, 0.880952381, 0.880952381], degree=3))
            add(Edge.make_bspline(
                [(19.026149745, 22.922537472), (17.889265745, 25.855772672), (14.767729145, 28.243707872), (11.600387345, 29.522529472)],
                knots=[0.880952381, 0.880952381, 0.880952381, 0.880952381, 0.904761905, 0.904761905, 0.904761905, 0.904761905], degree=3))
            add(Edge.make_bspline(
                [(11.600387345, 29.522529472), (7.516515945, 31.171436872), (4.360239745, 31.441081072), (-0.395228455, 31.563760272)],
                knots=[0.904761905, 0.904761905, 0.904761905, 0.904761905, 0.928571429, 0.928571429, 0.928571429, 0.928571429], degree=3))
            Line((-0.395228455, 31.563760272), (-0.008437855, 34.199687272))
            add(Edge.make_bspline(
                [(-0.008437855, 34.199687272), (-2.792314055, 33.808880072), (-2.675939055, 34.186972472), (-2.922122055, 31.499734072)],
                knots=[0.952380952, 0.952380952, 0.952380952, 0.952380952, 1, 1, 1, 1], degree=3))
            add(Edge.make_bspline(
                [(-2.922122055, 31.499734072), (-7.145271055, 31.020535072), (-10.056960255, 30.573176272), (-13.439203455, 28.765972272)],
                knots=[0, 0, 0, 0, 0.023809524, 0.023809524, 0.023809524, 0.023809524], degree=3))
            add(Edge.make_bspline(
                [(-13.439203455, 28.765972272), (-21.692545055, 24.356038072), (-21.405105455, 16.355901872), (-16.292612055, 12.264742072)],
                knots=[0.023809524, 0.023809524, 0.023809524, 0.023809524, 0.047619048, 0.047619048, 0.047619048, 0.047619048], degree=3))
            add(Edge.make_bspline(
                [(-16.292612055, 12.264742072), (-14.297346055, 10.668077072), (-12.293009455, 9.713270072), (-9.761913055, 8.929022272)],
                knots=[0.047619048, 0.047619048, 0.047619048, 0.047619048, 0.071428571, 0.071428571, 0.071428571, 0.071428571], degree=3))
            add(Edge.make_bspline(
                [(-9.761913055, 8.929022272), (-8.931328055, 8.671667272), (-7.740446055, 8.634959272), (-7.073637255, 8.229256072)],
                knots=[0.071428571, 0.071428571, 0.071428571, 0.071428571, 0.095238095, 0.095238095, 0.095238095, 0.095238095], degree=3))
            Line((-7.073637255, 8.229256072), (-7.006312655, 6.971209072))
            add(Edge.make_bspline(
                [(-7.006312655, 6.971209072), (-9.498360255, 6.970969672), (-11.985300655, 6.972618872), (-14.472187855, 6.970517472)],
                knots=[0.119047619, 0.119047619, 0.119047619, 0.119047619, 0.142857143, 0.142857143, 0.142857143, 0.142857143], degree=3))
            add(Edge.make_bspline(
                [(-14.472187855, 6.970517472), (-16.787904055, 6.968602272), (-19.279499455, 6.899575272), (-19.975328855, 8.856563872)],
                knots=[0.142857143, 0.142857143, 0.142857143, 0.142857143, 0.166666667, 0.166666667, 0.166666667, 0.166666667], degree=3))
            Line((-19.975328855, 8.856563872), (-21.262476255, 8.849807472))
            Line((-21.262476255, 8.849807472), (-21.274818655, 3.170148872))
            Line((-21.274818655, 3.170148872), (-2.646705655, 3.160945272))
        make_face()
    extrude(amount=-CORTE_EXTRUS_O2_DEPTH, mode=Mode.SUBTRACT)


solid = part.part
